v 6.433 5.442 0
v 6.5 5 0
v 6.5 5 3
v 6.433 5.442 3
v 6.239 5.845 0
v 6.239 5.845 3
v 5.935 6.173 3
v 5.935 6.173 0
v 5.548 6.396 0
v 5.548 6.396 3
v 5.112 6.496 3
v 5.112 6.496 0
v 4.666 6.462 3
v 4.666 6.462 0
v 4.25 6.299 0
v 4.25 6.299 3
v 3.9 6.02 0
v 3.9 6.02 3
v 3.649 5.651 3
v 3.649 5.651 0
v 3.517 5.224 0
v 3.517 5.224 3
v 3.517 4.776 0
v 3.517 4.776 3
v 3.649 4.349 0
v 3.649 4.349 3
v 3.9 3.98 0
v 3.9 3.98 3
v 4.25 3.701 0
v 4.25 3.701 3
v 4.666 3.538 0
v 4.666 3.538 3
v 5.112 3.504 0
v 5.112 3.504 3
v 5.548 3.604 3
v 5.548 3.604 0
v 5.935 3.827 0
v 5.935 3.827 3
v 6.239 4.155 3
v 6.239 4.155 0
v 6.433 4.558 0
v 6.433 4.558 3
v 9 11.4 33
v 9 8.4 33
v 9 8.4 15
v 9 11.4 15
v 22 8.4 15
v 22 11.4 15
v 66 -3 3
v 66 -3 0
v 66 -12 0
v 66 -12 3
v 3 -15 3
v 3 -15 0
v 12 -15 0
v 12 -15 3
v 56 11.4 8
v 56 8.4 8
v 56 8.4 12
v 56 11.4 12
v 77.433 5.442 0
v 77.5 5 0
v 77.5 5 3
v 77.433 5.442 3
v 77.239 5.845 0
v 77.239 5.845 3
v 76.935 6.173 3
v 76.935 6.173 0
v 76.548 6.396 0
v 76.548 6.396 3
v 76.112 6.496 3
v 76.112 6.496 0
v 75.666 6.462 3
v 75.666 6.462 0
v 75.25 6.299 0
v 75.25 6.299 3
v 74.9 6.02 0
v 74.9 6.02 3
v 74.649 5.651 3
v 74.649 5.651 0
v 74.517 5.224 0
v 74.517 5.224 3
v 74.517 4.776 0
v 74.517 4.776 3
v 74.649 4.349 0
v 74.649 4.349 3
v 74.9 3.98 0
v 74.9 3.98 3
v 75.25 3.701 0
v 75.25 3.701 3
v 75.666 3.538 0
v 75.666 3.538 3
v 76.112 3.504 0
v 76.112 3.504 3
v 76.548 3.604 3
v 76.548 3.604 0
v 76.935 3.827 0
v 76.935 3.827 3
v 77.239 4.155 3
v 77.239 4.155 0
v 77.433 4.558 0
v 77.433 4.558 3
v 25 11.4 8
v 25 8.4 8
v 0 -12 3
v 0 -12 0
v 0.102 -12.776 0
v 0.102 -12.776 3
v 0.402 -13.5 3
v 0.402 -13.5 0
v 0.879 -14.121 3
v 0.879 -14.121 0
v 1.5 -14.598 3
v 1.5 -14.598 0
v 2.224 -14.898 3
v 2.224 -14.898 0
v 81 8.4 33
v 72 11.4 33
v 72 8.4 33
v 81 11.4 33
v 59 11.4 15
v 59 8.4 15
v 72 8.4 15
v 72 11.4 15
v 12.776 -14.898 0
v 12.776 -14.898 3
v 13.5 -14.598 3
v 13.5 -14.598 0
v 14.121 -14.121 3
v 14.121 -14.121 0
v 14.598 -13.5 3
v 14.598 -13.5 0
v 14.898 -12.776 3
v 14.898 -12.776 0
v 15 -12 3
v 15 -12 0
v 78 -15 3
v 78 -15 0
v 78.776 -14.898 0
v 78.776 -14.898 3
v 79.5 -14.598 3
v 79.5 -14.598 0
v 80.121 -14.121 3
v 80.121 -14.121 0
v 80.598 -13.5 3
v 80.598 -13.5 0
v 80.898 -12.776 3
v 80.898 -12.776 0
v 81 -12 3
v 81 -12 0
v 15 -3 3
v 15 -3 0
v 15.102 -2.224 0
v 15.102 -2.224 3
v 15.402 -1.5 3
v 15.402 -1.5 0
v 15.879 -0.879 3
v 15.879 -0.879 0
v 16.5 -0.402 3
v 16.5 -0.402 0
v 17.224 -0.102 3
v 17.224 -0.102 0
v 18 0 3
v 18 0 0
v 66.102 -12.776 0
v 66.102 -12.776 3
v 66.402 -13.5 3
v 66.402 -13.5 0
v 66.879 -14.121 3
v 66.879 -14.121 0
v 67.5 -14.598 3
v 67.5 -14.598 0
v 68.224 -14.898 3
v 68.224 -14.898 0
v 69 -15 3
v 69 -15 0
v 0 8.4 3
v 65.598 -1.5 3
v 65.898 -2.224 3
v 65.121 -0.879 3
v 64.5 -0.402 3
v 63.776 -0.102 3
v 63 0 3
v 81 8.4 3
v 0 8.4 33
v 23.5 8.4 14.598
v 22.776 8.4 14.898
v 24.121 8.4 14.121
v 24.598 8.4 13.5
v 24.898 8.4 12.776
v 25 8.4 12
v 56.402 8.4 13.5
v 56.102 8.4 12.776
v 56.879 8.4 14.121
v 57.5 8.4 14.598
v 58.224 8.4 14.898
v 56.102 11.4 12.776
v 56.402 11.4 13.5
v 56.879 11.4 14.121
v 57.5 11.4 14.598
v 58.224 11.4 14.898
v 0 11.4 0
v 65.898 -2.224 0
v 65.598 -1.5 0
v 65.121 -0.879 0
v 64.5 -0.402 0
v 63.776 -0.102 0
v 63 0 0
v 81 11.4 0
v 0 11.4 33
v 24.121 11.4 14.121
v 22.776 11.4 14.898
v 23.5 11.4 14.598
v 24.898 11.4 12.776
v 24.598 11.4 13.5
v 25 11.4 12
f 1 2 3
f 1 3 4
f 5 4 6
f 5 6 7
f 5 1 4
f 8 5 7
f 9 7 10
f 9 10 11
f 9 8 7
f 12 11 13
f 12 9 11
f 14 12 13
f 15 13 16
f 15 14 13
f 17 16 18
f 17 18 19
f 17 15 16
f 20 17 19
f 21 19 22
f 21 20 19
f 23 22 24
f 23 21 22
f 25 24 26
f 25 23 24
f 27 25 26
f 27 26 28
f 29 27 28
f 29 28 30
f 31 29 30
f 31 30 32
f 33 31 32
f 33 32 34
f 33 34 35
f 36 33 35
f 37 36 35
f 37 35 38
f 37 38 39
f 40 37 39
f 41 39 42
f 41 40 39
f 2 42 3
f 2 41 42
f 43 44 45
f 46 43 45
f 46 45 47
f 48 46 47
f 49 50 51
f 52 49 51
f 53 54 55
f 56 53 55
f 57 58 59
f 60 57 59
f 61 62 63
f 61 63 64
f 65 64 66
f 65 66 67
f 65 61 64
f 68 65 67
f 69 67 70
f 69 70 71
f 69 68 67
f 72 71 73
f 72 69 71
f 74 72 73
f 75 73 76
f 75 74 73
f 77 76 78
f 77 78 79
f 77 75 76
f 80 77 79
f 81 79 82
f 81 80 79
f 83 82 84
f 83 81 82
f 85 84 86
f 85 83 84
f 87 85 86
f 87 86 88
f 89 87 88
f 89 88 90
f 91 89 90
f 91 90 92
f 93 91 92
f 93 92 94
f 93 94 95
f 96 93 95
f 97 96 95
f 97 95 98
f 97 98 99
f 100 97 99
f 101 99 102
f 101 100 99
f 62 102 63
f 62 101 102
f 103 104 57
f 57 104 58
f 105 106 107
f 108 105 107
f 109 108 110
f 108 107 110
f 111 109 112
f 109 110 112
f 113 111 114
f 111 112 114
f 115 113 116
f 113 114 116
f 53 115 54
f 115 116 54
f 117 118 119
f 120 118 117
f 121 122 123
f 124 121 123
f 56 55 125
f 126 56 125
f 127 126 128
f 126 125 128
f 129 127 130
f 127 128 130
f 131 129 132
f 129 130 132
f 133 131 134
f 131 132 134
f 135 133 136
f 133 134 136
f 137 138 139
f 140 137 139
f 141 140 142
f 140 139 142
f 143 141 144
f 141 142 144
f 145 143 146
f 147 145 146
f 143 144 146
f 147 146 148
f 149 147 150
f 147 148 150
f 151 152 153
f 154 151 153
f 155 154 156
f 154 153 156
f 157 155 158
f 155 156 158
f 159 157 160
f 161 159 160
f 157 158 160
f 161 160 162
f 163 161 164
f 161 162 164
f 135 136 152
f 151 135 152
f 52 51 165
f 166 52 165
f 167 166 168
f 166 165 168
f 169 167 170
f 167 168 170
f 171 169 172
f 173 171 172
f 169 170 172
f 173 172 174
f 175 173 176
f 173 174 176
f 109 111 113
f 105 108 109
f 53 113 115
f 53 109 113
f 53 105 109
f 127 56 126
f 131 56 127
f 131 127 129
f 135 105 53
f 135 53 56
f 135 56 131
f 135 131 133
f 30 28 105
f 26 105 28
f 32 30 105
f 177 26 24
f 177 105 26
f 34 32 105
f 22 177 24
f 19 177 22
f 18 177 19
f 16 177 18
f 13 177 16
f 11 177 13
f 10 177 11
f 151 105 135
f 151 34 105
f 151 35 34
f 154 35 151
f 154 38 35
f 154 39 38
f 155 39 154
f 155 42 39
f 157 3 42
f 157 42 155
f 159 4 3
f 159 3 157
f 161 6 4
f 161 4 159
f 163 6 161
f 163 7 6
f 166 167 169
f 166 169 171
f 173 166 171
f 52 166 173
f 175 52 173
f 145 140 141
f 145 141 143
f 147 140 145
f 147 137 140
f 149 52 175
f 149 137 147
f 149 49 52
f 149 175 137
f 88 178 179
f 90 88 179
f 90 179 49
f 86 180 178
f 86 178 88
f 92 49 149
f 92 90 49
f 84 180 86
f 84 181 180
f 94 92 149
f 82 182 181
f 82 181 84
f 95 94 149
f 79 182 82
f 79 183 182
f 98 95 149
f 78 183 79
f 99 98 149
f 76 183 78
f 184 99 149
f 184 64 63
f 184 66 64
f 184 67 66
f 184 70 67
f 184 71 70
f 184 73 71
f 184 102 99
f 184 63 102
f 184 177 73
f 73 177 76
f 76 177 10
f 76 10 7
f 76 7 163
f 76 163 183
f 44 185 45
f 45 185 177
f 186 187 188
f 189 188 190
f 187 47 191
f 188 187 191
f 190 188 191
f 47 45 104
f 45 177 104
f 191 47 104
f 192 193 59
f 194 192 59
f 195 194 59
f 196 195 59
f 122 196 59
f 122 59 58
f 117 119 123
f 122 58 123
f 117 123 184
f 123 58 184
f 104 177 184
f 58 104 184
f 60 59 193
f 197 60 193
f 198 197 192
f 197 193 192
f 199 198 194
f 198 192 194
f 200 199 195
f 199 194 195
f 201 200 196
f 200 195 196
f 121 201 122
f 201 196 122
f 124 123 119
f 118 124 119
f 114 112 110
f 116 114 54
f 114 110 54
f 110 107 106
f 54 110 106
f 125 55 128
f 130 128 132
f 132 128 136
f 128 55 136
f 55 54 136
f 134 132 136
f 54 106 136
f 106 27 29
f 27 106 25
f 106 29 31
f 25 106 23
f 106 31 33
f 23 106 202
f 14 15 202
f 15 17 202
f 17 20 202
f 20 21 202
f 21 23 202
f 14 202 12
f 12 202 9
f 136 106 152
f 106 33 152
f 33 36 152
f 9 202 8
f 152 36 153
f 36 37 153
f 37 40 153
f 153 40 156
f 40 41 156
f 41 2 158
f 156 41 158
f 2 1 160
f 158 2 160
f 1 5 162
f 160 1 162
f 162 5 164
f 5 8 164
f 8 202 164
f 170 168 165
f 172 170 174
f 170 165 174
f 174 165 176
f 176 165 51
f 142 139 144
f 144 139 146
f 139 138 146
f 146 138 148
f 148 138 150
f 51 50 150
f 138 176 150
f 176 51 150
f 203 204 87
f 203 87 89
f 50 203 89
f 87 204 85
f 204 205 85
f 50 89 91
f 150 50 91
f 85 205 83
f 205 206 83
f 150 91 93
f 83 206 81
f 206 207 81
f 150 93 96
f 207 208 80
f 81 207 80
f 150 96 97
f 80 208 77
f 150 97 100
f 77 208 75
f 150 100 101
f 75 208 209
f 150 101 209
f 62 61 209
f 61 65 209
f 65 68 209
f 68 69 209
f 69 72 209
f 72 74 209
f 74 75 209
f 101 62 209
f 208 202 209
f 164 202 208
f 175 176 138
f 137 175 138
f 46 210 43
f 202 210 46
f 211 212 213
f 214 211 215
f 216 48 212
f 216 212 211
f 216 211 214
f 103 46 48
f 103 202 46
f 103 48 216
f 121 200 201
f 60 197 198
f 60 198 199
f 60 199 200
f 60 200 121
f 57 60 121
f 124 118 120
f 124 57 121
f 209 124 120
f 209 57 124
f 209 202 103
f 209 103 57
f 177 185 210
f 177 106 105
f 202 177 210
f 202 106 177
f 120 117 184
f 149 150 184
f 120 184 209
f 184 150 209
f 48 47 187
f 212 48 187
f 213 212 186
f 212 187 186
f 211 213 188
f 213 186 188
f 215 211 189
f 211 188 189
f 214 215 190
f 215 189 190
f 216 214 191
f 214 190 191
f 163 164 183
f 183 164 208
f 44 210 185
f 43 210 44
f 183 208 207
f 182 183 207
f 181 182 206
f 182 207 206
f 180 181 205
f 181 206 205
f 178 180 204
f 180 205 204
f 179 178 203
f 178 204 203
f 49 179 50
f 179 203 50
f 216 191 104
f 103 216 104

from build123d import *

# Parameters (mm, degrees)
F0_R     = 1.5
F1_DEPTH = 3
F2_W     = 81
F2_H     = 3
F3_DEPTH = 30
F5_DEPTH = 3


with BuildPart() as f1:
    # F0 (on Top) → F1 (new body)
    with BuildSketch(Plane.XY):
        with BuildLine():
            Line((81, 11.4), (0, 11.4))
            Line((0, 11.4), (0, 0))
            Line((0, 0), (0, -12))
            ThreePointArc((0, -12), (0.87868, -14.12132), (3, -15))
            Line((3, -15), (12, -15))
            ThreePointArc((12, -15), (14.12132, -14.12132), (15, -12))
            Line((15, -12), (15, -3))
            ThreePointArc((15, -3), (15.87868, -0.87868), (18, 0))
            Line((18, 0), (63, 0))
            ThreePointArc((63, 0), (65.12132, -0.87868), (66, -3))
            Line((66, -3), (66, -12))
            ThreePointArc((66, -12), (66.87868, -14.12132), (69, -15))
            Line((69, -15), (78, -15))
            ThreePointArc((78, -15), (80.12132, -14.12132), (81, -12))
            Line((81, -12), (81, 0))
            Line((81, 0), (81, 11.4))
        make_face()
        with Locations((5, 5)):
            Circle(F0_R, mode=Mode.SUBTRACT)
        with Locations((76, 5)):
            Circle(F0_R, mode=Mode.SUBTRACT)
    extrude(amount=F1_DEPTH)

    # F2 (on face) → F3 (join)
    with BuildSketch(Plane.XY.offset(3)):
        with Locations((40.5, 9.9)):
            Rectangle(F2_W, F2_H)
    extrude(amount=F3_DEPTH)

    # F4 (on face) → F5 (cut, through all)
    with BuildSketch(Plane.XZ.offset(-8.4)):
        with BuildLine():
            Line((72, 33), (9, 33))
            Line((9, 33), (9, 15))
            Line((9, 15), (22, 15))
            ThreePointArc((22, 15), (24.12132, 14.12132), (25, 12))
            Line((25, 12), (25, 8))
            Line((25, 8), (56, 8))
            Line((56, 8), (56, 12))
            ThreePointArc((56, 12), (56.87868, 14.12132), (59, 15))
            Line((59, 15), (72, 15))
            Line((72, 15), (72, 33))
        make_face()
    extrude(amount=-F5_DEPTH, mode=Mode.SUBTRACT)


solid = f1.part
